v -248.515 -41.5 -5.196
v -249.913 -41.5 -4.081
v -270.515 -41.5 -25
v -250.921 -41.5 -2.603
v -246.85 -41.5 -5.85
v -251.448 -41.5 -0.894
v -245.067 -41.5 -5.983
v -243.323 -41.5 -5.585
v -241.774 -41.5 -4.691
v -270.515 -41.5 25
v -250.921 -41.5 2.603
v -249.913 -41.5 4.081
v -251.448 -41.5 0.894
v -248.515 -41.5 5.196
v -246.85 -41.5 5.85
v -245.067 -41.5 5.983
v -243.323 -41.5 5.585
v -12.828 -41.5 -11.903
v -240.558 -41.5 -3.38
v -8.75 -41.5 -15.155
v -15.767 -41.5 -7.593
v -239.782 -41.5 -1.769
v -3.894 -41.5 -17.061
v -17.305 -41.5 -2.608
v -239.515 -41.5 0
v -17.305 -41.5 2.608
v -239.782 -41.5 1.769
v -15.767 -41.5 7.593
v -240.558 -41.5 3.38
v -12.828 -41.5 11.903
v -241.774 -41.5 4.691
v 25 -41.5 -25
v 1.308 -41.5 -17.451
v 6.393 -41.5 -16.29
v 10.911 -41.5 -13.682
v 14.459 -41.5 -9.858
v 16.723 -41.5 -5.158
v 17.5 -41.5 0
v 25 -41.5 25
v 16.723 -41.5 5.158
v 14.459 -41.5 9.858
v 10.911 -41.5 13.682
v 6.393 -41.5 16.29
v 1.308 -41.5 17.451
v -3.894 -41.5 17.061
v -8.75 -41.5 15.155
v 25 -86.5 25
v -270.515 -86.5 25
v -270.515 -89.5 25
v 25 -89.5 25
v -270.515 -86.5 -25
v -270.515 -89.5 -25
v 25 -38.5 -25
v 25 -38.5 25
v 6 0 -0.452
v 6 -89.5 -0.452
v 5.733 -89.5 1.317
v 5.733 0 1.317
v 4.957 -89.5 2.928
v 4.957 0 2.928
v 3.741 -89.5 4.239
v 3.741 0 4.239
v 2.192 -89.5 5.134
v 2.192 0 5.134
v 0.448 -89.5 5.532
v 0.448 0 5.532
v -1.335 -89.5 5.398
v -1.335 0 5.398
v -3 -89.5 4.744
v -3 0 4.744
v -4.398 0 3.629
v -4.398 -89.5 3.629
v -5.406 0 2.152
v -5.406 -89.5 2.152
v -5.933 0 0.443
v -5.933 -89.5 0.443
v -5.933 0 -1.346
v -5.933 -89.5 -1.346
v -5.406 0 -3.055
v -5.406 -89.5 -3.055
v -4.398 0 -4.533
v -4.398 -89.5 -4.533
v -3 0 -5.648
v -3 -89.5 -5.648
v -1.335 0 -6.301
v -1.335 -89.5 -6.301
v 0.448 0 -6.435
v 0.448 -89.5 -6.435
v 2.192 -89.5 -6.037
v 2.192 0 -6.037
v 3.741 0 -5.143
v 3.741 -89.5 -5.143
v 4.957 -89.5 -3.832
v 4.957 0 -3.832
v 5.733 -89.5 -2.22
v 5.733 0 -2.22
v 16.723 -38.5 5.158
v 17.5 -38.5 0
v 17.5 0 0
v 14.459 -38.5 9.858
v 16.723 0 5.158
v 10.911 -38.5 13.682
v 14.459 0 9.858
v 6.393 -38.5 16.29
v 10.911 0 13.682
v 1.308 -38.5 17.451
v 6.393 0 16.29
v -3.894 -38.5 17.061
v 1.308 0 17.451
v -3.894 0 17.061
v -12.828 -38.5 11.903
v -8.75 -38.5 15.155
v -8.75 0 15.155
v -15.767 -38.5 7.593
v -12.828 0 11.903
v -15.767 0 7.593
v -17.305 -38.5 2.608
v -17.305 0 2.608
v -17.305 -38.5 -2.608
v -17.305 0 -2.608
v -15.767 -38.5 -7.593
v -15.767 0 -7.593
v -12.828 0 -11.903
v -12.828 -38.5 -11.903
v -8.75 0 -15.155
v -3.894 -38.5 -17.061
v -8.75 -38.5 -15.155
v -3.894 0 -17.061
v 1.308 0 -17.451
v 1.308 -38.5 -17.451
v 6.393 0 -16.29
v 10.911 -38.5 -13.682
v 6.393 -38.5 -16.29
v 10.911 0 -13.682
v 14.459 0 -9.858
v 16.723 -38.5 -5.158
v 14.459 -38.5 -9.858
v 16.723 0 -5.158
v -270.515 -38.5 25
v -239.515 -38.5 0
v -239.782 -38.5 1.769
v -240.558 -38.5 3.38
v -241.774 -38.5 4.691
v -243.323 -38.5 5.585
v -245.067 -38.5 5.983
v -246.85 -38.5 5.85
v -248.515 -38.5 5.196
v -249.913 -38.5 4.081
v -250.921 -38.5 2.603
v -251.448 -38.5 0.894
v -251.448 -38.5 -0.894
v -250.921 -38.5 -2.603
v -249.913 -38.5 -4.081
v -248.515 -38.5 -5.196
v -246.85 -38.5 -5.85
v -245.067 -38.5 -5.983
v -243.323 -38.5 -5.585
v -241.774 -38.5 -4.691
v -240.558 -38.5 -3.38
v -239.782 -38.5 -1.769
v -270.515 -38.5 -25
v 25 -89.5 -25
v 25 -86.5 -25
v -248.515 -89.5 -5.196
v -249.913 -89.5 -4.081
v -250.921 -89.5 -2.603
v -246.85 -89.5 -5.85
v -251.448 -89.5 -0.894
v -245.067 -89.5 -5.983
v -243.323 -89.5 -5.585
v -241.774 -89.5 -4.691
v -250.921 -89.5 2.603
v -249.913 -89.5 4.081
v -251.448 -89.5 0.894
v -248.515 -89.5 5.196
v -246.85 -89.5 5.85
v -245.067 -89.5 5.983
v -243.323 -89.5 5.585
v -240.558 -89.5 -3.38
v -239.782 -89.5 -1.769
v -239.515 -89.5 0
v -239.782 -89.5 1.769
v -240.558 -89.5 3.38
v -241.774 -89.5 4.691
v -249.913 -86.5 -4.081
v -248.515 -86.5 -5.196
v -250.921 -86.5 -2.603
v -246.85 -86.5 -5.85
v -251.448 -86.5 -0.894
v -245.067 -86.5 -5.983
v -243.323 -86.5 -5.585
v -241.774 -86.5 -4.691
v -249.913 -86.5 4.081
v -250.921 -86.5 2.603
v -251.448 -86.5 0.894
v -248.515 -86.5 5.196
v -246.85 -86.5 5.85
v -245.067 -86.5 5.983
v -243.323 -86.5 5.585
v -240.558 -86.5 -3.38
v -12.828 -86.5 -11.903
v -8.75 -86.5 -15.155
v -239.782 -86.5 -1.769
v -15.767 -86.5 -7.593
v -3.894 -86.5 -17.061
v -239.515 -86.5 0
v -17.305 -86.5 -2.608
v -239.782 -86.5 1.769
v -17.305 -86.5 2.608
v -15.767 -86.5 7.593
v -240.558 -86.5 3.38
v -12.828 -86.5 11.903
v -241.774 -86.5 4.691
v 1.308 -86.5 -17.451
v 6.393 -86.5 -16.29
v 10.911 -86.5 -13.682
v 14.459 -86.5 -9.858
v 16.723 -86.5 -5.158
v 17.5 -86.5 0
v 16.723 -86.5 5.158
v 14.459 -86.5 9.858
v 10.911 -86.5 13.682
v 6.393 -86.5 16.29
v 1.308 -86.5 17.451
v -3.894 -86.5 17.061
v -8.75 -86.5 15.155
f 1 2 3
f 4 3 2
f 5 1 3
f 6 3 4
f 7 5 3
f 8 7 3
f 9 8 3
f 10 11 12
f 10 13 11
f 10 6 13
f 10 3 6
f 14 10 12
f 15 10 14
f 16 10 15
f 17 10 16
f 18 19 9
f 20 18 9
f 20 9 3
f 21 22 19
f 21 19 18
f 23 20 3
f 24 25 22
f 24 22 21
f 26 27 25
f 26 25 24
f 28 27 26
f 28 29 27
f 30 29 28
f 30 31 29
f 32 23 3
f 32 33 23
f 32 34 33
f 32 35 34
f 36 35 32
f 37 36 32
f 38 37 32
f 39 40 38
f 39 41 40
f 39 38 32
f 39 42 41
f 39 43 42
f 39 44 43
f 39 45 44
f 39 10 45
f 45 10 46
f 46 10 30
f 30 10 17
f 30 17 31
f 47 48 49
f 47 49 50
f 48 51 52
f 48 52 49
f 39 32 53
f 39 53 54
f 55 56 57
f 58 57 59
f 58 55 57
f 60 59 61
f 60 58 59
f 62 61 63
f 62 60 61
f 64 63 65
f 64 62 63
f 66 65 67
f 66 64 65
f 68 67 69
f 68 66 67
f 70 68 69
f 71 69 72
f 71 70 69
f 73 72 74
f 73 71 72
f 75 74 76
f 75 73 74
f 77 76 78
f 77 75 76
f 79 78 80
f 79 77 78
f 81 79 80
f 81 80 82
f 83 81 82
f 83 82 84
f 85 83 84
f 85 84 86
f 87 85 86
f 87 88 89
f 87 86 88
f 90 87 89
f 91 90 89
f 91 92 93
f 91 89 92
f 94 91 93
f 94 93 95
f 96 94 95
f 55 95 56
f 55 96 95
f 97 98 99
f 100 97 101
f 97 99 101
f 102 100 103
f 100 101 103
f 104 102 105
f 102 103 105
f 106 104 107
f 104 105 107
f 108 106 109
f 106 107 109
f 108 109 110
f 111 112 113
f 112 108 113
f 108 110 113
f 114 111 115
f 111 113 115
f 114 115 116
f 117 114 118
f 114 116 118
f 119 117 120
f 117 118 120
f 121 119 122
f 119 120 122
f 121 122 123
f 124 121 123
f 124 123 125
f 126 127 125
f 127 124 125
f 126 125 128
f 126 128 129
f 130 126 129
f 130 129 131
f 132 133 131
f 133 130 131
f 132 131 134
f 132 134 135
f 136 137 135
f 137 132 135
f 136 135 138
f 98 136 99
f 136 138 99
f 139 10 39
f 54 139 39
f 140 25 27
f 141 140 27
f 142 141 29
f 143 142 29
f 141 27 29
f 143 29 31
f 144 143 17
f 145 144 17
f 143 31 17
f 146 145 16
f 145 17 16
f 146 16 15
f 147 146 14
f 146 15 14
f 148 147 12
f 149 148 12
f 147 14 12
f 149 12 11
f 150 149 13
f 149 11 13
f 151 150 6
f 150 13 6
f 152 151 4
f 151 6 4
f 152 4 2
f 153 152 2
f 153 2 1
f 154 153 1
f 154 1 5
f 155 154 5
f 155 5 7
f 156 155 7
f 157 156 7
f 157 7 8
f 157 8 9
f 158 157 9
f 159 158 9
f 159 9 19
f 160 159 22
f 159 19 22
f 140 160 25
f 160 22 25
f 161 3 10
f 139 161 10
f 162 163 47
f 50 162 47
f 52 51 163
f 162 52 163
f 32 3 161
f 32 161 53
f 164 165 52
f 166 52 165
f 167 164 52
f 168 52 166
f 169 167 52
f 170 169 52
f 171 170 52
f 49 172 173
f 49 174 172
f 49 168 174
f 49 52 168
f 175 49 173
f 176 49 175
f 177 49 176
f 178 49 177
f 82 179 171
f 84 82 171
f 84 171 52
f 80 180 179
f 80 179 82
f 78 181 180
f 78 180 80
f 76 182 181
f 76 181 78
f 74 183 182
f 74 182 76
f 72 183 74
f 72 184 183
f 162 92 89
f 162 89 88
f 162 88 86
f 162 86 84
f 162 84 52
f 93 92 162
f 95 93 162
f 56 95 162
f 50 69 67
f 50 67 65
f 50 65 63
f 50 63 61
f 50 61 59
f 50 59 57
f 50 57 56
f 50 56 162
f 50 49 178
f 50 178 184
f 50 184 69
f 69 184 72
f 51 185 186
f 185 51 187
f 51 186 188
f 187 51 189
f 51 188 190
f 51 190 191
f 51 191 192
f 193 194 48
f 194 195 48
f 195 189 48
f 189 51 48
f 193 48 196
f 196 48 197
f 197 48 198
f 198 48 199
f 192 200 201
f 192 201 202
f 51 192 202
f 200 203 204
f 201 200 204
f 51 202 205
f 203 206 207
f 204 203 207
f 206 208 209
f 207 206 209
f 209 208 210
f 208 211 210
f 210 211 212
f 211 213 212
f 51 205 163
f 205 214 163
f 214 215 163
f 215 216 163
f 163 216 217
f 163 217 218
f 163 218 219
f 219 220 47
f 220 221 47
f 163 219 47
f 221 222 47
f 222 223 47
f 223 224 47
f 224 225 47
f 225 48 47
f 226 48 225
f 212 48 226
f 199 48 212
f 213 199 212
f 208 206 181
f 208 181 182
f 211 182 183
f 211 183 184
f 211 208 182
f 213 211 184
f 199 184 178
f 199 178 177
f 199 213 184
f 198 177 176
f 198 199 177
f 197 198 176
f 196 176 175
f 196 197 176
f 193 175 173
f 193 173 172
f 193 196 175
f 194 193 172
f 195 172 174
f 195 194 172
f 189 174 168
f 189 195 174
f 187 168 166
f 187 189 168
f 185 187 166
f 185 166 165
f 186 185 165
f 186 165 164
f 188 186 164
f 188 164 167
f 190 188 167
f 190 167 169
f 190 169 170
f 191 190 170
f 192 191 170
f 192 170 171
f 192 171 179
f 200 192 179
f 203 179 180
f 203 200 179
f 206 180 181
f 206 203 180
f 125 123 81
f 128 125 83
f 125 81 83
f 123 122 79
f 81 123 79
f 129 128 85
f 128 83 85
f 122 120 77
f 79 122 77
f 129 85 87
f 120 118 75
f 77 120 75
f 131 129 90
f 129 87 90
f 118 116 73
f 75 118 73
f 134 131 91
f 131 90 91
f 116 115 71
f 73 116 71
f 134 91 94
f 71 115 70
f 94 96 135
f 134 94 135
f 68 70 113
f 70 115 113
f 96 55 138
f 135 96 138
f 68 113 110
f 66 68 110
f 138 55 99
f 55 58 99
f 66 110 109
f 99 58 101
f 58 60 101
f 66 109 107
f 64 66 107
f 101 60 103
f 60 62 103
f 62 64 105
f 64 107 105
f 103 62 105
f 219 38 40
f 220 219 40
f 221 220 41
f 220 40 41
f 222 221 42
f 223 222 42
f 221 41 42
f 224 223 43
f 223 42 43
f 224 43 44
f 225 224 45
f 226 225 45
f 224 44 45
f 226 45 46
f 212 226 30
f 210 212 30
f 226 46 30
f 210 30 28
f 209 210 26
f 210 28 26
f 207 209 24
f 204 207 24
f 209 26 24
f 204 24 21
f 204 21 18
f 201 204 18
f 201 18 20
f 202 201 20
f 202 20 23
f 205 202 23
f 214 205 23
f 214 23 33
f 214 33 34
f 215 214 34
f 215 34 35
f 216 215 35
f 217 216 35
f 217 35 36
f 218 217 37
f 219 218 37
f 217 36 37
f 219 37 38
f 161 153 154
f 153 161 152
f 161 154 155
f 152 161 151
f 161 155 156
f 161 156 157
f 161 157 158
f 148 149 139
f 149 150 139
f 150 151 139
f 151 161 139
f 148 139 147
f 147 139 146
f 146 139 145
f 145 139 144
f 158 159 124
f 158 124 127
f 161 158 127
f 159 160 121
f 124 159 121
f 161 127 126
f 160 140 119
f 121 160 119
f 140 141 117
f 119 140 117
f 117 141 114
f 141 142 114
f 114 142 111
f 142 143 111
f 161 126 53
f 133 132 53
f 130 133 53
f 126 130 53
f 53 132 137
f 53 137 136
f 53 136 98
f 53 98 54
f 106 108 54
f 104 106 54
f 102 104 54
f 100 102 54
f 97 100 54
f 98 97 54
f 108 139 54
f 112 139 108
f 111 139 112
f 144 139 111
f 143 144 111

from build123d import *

# Parameters (mm, degrees)
F0_R     = 17.5
F1_DEPTH = 41.5
F2_W     = 295.515
F2_H     = 50
F2_R     = 6
F3_DEPTH = 3
F4_R     = 17.5
F5_DEPTH = 45
F6_W     = 295.515
F6_H     = 50
F6_R     = 6
F7_DEPTH = 3
F8_R     = 6
F9_DEPTH = 89.501


with BuildPart() as f1:
    # F0 (on Front) → F1 (new body)
    with BuildSketch(Plane.XZ):
        Circle(F0_R)
    extrude(amount=F1_DEPTH)

    # F2 (on face) → F3 (join)
    with BuildSketch(Plane.XZ.offset(41.5)):
        with Locations((-122.7575, 0)):
            Rectangle(F2_W, F2_H)
        with Locations((-245.515, 0)):
            Circle(F2_R, mode=Mode.SUBTRACT)
    extrude(amount=-F3_DEPTH)

    # F4 (on face) → F5 (join)
    with BuildSketch(Plane.XZ.offset(41.5)):
        Circle(F4_R)
    extrude(amount=F5_DEPTH)

    # F6 (on face) → F7 (join)
    with BuildSketch(Plane.XZ.offset(86.5)):
        with Locations((-122.7575, 0)):
            Rectangle(F6_W, F6_H)
        with Locations((-245.515, 0)):
            Circle(F6_R, mode=Mode.SUBTRACT)
    extrude(amount=F7_DEPTH)

    # F8 (on Front) → F9 (cut, through all)
    with BuildSketch(Plane.XZ):
        with Locations((0, -0.451715)):
            Circle(F8_R)
    extrude(amount=F9_DEPTH, mode=Mode.SUBTRACT)


solid = f1.part
